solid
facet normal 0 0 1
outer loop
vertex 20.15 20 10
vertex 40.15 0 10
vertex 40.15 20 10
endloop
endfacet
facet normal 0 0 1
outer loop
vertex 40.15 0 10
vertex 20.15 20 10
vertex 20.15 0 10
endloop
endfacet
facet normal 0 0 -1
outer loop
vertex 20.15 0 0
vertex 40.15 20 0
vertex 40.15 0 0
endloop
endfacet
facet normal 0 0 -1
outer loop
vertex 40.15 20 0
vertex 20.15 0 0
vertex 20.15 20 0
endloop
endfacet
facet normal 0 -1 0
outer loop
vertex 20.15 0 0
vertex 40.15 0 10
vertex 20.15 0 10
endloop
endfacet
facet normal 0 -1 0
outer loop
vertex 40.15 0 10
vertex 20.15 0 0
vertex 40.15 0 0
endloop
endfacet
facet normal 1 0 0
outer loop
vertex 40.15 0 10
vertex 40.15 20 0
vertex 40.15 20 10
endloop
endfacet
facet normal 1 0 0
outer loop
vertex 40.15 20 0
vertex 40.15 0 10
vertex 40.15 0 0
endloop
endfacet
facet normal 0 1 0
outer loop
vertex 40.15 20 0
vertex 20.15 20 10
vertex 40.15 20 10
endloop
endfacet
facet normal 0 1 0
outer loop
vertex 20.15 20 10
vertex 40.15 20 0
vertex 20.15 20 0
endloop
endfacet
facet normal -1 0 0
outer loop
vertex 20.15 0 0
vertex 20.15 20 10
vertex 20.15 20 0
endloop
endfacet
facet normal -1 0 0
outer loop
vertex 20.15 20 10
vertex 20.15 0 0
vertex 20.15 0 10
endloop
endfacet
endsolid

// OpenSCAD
$fa = 8; $fs = 1;
translate([20.15, 0, 0]) cube([20, 20, 10]);
